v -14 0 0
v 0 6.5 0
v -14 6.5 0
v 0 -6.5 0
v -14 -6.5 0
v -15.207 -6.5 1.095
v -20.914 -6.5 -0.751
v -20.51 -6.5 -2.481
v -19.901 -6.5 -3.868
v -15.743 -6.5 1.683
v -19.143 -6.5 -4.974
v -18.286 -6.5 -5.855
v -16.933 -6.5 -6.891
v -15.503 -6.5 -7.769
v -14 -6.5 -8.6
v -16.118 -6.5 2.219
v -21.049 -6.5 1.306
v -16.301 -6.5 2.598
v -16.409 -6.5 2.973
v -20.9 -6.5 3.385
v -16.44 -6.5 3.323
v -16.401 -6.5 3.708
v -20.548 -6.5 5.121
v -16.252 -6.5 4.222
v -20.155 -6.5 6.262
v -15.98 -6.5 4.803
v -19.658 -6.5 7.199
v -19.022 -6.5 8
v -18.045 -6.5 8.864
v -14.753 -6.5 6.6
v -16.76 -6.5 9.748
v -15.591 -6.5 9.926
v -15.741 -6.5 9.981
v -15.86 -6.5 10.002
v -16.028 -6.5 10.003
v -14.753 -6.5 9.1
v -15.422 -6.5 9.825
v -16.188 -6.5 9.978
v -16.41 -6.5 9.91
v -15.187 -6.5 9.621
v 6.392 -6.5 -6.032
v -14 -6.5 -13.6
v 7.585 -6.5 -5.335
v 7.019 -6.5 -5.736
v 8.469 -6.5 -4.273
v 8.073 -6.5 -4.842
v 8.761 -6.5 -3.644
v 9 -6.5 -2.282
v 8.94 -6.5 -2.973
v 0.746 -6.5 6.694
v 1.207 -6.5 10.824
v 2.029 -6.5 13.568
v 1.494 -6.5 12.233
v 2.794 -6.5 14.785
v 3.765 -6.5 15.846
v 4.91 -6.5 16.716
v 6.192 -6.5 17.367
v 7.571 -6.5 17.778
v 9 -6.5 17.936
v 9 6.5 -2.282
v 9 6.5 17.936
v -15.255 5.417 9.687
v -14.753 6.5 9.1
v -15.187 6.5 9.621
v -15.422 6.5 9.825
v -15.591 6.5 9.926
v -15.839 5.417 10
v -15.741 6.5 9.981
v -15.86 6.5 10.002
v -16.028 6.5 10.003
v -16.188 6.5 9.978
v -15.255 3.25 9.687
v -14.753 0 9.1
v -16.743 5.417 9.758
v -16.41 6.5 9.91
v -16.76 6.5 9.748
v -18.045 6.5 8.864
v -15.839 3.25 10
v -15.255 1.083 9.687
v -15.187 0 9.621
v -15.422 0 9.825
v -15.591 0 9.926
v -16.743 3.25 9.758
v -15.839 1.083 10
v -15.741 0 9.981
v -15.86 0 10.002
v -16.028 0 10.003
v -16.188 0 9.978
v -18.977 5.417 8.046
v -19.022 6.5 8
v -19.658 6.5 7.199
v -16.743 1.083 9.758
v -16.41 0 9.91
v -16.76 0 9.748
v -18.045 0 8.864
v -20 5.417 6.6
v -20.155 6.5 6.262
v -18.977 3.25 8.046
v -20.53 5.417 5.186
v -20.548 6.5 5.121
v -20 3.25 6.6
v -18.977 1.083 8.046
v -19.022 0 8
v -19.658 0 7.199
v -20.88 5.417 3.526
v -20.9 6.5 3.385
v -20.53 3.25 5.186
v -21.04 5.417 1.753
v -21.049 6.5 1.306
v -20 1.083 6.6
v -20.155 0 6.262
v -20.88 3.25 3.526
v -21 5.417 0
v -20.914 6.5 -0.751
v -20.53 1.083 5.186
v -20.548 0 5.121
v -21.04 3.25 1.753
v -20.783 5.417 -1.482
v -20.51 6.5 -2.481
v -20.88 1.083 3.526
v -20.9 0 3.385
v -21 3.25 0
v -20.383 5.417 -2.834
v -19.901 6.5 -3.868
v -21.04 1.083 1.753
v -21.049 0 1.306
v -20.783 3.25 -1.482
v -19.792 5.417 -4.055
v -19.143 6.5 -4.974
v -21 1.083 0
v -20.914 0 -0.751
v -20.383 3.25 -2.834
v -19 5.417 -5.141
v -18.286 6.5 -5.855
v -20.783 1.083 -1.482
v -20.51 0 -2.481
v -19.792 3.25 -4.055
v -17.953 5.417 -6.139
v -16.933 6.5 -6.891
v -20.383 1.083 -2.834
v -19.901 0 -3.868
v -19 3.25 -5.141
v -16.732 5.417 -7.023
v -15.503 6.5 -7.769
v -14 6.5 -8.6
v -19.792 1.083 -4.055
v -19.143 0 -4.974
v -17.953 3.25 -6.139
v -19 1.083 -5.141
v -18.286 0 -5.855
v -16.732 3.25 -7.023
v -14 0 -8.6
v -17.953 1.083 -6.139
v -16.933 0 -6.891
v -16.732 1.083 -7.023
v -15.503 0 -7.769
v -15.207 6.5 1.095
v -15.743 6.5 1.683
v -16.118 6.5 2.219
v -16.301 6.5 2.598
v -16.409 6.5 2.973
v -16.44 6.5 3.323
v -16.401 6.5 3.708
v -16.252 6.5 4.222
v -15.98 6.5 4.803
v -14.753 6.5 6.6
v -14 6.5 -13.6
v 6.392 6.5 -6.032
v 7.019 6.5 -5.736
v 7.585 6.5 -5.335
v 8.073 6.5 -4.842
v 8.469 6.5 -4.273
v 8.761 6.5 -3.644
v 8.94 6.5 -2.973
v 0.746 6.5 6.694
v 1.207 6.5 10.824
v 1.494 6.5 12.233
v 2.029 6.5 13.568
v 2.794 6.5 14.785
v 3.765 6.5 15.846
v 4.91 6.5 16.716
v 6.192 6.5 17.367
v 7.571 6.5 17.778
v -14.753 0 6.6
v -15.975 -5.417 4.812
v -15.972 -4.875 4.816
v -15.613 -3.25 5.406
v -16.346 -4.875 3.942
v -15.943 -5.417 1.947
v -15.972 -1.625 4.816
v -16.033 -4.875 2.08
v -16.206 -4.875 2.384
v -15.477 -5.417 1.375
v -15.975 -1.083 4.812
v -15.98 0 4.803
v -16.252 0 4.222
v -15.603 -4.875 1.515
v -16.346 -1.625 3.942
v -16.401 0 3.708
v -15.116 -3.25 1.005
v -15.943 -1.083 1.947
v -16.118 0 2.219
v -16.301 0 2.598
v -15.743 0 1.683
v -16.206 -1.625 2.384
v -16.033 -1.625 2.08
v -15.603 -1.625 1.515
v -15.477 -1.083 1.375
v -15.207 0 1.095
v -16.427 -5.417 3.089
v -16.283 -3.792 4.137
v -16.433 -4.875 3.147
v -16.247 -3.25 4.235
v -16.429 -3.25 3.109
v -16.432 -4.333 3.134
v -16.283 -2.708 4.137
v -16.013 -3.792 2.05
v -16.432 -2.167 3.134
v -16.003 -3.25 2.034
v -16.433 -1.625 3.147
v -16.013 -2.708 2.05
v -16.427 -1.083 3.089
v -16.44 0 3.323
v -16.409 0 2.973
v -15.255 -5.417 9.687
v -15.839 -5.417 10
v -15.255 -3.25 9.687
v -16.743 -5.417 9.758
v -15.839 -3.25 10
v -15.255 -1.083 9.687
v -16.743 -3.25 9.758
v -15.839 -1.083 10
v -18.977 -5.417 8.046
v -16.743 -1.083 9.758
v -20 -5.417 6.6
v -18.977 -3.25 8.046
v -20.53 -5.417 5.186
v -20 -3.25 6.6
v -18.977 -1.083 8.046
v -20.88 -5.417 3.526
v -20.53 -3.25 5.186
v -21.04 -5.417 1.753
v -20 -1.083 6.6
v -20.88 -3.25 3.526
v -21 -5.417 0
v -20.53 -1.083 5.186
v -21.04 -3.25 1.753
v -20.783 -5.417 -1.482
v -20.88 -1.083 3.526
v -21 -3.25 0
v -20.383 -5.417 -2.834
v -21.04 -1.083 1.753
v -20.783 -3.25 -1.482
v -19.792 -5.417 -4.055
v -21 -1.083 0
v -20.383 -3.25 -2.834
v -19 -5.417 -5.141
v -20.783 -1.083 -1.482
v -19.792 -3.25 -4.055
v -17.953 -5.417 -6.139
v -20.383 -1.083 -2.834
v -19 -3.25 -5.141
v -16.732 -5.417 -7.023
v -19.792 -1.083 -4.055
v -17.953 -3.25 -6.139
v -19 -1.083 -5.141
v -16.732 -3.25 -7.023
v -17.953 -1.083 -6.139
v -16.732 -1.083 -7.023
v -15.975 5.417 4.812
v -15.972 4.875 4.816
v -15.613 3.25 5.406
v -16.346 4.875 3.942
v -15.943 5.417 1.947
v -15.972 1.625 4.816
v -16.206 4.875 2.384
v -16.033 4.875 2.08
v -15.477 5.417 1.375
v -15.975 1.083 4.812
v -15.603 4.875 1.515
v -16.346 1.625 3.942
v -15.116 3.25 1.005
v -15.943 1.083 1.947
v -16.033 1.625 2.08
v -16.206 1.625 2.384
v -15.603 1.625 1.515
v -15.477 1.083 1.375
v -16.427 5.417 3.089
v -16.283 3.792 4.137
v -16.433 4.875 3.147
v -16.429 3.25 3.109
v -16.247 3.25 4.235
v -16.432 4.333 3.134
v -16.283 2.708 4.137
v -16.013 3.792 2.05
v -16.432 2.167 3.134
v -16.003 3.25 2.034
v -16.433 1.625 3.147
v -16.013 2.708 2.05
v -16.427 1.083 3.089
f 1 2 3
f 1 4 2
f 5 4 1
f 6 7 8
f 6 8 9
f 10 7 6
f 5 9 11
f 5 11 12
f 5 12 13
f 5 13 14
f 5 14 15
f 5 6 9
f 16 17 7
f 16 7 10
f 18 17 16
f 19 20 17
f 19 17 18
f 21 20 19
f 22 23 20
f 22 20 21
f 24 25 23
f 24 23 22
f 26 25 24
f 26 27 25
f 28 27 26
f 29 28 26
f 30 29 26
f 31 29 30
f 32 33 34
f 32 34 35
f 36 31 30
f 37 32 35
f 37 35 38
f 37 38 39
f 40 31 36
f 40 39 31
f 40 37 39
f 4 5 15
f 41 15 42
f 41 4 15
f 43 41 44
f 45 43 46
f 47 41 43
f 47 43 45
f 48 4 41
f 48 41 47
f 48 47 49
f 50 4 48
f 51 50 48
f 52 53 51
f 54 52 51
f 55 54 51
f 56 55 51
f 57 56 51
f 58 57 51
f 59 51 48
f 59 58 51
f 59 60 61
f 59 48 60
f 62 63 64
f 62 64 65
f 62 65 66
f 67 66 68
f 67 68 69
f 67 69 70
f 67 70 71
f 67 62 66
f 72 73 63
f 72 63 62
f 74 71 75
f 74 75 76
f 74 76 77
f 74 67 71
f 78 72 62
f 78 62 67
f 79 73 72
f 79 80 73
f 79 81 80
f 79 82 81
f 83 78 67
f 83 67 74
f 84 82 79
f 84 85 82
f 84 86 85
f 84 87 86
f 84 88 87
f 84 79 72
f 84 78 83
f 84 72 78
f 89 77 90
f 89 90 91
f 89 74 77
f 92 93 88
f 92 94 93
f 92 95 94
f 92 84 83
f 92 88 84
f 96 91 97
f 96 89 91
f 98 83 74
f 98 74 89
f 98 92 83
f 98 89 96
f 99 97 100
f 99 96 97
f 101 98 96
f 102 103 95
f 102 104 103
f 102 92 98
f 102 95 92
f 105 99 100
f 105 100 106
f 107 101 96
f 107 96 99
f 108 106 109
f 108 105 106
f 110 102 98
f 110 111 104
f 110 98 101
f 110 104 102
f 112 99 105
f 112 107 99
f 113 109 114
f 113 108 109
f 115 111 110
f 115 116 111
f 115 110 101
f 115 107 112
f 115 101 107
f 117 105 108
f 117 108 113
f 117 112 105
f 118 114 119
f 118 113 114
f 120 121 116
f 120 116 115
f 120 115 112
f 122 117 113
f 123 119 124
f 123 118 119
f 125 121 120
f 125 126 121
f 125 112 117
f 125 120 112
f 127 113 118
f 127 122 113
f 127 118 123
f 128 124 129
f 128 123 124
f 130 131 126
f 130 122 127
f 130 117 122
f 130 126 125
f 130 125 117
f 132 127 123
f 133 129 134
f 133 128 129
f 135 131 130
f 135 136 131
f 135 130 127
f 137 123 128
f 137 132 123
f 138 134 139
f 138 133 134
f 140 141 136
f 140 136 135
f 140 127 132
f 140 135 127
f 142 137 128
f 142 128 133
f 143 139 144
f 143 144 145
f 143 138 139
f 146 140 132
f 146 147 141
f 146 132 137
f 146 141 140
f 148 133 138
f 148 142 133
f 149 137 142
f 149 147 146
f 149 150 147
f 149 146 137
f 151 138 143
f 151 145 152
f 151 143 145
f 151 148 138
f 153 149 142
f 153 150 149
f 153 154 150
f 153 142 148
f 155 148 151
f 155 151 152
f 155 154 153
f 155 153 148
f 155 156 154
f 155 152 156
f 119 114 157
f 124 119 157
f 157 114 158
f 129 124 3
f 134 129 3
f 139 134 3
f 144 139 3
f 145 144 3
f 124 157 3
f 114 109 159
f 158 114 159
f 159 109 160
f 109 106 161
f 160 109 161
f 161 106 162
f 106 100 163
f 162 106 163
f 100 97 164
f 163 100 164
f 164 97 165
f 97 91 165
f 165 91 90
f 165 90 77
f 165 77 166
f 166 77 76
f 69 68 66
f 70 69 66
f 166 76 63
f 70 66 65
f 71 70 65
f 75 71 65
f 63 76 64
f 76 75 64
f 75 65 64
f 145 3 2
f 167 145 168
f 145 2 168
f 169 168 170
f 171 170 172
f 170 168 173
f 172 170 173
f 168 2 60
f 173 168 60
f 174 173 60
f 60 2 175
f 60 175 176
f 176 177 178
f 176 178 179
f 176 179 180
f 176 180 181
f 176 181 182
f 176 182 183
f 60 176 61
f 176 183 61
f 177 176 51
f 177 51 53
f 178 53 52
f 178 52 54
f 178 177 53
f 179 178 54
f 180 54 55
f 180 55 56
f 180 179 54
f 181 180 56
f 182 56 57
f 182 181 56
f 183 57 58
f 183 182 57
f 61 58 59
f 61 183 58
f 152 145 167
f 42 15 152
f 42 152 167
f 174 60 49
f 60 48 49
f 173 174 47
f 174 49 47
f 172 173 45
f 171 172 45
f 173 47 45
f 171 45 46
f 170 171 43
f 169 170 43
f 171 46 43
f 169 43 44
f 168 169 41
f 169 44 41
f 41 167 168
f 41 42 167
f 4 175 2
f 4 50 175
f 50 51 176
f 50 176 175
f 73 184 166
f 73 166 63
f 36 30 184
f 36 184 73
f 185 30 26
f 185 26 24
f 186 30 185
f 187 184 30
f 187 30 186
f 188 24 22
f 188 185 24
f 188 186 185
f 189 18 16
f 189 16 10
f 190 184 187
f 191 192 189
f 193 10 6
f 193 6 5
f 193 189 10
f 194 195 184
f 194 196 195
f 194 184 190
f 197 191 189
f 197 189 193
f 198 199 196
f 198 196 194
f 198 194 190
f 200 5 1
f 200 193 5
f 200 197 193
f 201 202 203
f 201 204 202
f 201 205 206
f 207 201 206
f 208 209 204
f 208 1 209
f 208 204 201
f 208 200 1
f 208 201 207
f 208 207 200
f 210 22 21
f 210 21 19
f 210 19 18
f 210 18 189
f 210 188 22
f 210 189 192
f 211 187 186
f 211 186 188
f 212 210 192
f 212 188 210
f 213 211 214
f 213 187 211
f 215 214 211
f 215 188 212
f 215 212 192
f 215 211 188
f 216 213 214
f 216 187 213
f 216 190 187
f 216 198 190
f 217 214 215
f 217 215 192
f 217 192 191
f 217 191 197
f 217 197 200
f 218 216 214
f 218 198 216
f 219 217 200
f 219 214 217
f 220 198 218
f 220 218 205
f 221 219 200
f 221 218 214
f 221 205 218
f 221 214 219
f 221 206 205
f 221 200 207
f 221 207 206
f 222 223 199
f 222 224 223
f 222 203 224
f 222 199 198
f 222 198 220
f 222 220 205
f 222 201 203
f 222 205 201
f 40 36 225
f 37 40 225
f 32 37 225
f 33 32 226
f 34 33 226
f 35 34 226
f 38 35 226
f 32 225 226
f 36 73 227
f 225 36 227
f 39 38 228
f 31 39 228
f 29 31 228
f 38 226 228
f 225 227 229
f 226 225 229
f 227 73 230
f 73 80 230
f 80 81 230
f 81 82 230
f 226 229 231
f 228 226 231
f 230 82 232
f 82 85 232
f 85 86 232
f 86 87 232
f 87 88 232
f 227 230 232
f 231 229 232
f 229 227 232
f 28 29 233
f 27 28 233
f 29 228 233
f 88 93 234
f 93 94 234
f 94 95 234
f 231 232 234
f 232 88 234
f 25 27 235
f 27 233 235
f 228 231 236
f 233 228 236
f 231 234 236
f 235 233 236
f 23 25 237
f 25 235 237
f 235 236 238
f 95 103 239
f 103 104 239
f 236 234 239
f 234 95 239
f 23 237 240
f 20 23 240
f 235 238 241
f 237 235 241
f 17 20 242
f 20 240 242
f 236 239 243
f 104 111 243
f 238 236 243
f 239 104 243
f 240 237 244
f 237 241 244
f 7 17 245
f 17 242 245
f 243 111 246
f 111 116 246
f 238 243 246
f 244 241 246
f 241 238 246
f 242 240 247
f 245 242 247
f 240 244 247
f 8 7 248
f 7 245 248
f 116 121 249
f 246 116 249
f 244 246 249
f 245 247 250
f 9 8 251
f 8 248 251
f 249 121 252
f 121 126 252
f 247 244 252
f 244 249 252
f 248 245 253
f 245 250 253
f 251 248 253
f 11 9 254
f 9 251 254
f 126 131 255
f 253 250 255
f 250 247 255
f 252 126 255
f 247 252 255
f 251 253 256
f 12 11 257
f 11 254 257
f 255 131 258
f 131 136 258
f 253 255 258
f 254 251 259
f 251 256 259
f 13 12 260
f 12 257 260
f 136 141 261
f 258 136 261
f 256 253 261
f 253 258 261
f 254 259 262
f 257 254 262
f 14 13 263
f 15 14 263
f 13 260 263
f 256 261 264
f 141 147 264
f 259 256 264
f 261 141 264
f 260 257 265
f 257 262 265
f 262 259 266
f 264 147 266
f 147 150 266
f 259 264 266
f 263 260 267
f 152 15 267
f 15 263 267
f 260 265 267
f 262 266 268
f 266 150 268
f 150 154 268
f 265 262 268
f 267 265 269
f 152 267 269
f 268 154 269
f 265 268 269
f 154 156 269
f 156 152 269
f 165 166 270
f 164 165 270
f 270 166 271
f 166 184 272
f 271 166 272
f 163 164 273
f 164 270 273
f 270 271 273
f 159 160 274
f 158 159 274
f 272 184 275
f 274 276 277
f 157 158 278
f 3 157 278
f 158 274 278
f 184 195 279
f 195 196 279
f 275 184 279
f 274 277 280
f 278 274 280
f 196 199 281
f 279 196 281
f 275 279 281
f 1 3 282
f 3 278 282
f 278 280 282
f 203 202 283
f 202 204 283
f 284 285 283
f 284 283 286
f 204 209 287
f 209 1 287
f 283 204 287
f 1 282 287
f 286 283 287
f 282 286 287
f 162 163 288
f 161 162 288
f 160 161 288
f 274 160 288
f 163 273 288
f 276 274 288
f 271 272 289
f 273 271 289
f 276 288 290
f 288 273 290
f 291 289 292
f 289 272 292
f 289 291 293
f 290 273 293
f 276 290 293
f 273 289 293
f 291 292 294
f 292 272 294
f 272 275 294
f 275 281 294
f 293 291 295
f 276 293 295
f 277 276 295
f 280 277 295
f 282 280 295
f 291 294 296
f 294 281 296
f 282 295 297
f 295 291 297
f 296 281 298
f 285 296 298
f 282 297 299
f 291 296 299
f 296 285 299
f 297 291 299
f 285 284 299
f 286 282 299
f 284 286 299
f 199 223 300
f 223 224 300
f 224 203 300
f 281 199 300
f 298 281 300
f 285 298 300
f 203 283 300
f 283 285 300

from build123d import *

# Parameters (mm, degrees)
F1_DEPTH    = 6.5
F2_T1_DEPTH = 48.7796937487
F3_R        = 4


# Not quite as in the source:
# - a fillet or chamfer that OpenCascade refuses, or shapes differently, is made with other operations: its cross-section is extruded or revolved along the edge and cut away or added


with BuildPart() as f1:
    # F0 (on Front) → F1 (new body, symmetric)
    with BuildSketch(Plane.XZ):
        with BuildLine():
            Line((0, 0), (-14, 0))
            add(Edge.make_bspline(
                [(-14.753227005, 6.6), (-15.6505771516, 5.402281958), (-17.4537159579, 2.9955827572), (-15.1548248478, 1.0016380744), (-14, 0)],
                knots=[0, 0, 0, 0, 0.4976600489, 1, 1, 1, 1], degree=3))
            Line((-14.753227005, 6.6), (-14.753227005, 9.1))
            add(Edge.make_bspline(
                [(-14.753227005, 9.1), (-15.0782830968, 9.5217558402), (-15.8019667592, 10.4607255098), (-17.9577835755, 8.9859803429), (-20.5635971664, 6.8288464563), (-21.5233314219, -0.162172448), (-19.5302154879, -5.5960603901), (-15.8730160291, -7.5826025673), (-14, -8.6)],
                knots=[0, 0, 0, 0, 0.1000363237, 0.2227143405, 0.3768740844, 0.5944901084, 0.7923201796, 1, 1, 1, 1], degree=3))
            Line((-14, -8.6), (-14, -13.6))
            Line((-14, -13.6), (9, -5.0644312273))
            Line((9, -5.0644312273), (9, 17.9355687727))
            Line((9, 17.9355687727), (2, 17.9355687727))
            Line((2, 17.9355687727), (0.7464859836, 6.6943253484))
            Line((0.7464859836, 6.6943253484), (0.3732429918, 3.3471626742))
            Line((0.3732429918, 3.3471626742), (0, 0))
        make_face()
    extrude(amount=F1_DEPTH, both=True)

    # F2: fillet of radius 8 on 1 edges, made by hand

    # F2_s2 → F2_t1 (cut)
    with BuildSketch(Plane.XZ.offset(-24.3898468744)):
        with BuildLine():
            ThreePointArc((1.2069547277, 10.8237097622), (3.7649807454, 15.8463394269), (9, 17.9355687727))
            Line((9, 17.9355687727), (2, 17.9355687727))
            Line((2, 17.9355687727), (1.2069547277, 10.8237097622))
        make_face()
    extrude(amount=F2_T1_DEPTH, mode=Mode.SUBTRACT)

    # F3
    f3_edges = [f1.edges().sort_by_distance(p)[0] for p in [
        (9, 0, -5.064431),
    ]]
    fillet(f3_edges, radius=F3_R)


solid = f1.part
